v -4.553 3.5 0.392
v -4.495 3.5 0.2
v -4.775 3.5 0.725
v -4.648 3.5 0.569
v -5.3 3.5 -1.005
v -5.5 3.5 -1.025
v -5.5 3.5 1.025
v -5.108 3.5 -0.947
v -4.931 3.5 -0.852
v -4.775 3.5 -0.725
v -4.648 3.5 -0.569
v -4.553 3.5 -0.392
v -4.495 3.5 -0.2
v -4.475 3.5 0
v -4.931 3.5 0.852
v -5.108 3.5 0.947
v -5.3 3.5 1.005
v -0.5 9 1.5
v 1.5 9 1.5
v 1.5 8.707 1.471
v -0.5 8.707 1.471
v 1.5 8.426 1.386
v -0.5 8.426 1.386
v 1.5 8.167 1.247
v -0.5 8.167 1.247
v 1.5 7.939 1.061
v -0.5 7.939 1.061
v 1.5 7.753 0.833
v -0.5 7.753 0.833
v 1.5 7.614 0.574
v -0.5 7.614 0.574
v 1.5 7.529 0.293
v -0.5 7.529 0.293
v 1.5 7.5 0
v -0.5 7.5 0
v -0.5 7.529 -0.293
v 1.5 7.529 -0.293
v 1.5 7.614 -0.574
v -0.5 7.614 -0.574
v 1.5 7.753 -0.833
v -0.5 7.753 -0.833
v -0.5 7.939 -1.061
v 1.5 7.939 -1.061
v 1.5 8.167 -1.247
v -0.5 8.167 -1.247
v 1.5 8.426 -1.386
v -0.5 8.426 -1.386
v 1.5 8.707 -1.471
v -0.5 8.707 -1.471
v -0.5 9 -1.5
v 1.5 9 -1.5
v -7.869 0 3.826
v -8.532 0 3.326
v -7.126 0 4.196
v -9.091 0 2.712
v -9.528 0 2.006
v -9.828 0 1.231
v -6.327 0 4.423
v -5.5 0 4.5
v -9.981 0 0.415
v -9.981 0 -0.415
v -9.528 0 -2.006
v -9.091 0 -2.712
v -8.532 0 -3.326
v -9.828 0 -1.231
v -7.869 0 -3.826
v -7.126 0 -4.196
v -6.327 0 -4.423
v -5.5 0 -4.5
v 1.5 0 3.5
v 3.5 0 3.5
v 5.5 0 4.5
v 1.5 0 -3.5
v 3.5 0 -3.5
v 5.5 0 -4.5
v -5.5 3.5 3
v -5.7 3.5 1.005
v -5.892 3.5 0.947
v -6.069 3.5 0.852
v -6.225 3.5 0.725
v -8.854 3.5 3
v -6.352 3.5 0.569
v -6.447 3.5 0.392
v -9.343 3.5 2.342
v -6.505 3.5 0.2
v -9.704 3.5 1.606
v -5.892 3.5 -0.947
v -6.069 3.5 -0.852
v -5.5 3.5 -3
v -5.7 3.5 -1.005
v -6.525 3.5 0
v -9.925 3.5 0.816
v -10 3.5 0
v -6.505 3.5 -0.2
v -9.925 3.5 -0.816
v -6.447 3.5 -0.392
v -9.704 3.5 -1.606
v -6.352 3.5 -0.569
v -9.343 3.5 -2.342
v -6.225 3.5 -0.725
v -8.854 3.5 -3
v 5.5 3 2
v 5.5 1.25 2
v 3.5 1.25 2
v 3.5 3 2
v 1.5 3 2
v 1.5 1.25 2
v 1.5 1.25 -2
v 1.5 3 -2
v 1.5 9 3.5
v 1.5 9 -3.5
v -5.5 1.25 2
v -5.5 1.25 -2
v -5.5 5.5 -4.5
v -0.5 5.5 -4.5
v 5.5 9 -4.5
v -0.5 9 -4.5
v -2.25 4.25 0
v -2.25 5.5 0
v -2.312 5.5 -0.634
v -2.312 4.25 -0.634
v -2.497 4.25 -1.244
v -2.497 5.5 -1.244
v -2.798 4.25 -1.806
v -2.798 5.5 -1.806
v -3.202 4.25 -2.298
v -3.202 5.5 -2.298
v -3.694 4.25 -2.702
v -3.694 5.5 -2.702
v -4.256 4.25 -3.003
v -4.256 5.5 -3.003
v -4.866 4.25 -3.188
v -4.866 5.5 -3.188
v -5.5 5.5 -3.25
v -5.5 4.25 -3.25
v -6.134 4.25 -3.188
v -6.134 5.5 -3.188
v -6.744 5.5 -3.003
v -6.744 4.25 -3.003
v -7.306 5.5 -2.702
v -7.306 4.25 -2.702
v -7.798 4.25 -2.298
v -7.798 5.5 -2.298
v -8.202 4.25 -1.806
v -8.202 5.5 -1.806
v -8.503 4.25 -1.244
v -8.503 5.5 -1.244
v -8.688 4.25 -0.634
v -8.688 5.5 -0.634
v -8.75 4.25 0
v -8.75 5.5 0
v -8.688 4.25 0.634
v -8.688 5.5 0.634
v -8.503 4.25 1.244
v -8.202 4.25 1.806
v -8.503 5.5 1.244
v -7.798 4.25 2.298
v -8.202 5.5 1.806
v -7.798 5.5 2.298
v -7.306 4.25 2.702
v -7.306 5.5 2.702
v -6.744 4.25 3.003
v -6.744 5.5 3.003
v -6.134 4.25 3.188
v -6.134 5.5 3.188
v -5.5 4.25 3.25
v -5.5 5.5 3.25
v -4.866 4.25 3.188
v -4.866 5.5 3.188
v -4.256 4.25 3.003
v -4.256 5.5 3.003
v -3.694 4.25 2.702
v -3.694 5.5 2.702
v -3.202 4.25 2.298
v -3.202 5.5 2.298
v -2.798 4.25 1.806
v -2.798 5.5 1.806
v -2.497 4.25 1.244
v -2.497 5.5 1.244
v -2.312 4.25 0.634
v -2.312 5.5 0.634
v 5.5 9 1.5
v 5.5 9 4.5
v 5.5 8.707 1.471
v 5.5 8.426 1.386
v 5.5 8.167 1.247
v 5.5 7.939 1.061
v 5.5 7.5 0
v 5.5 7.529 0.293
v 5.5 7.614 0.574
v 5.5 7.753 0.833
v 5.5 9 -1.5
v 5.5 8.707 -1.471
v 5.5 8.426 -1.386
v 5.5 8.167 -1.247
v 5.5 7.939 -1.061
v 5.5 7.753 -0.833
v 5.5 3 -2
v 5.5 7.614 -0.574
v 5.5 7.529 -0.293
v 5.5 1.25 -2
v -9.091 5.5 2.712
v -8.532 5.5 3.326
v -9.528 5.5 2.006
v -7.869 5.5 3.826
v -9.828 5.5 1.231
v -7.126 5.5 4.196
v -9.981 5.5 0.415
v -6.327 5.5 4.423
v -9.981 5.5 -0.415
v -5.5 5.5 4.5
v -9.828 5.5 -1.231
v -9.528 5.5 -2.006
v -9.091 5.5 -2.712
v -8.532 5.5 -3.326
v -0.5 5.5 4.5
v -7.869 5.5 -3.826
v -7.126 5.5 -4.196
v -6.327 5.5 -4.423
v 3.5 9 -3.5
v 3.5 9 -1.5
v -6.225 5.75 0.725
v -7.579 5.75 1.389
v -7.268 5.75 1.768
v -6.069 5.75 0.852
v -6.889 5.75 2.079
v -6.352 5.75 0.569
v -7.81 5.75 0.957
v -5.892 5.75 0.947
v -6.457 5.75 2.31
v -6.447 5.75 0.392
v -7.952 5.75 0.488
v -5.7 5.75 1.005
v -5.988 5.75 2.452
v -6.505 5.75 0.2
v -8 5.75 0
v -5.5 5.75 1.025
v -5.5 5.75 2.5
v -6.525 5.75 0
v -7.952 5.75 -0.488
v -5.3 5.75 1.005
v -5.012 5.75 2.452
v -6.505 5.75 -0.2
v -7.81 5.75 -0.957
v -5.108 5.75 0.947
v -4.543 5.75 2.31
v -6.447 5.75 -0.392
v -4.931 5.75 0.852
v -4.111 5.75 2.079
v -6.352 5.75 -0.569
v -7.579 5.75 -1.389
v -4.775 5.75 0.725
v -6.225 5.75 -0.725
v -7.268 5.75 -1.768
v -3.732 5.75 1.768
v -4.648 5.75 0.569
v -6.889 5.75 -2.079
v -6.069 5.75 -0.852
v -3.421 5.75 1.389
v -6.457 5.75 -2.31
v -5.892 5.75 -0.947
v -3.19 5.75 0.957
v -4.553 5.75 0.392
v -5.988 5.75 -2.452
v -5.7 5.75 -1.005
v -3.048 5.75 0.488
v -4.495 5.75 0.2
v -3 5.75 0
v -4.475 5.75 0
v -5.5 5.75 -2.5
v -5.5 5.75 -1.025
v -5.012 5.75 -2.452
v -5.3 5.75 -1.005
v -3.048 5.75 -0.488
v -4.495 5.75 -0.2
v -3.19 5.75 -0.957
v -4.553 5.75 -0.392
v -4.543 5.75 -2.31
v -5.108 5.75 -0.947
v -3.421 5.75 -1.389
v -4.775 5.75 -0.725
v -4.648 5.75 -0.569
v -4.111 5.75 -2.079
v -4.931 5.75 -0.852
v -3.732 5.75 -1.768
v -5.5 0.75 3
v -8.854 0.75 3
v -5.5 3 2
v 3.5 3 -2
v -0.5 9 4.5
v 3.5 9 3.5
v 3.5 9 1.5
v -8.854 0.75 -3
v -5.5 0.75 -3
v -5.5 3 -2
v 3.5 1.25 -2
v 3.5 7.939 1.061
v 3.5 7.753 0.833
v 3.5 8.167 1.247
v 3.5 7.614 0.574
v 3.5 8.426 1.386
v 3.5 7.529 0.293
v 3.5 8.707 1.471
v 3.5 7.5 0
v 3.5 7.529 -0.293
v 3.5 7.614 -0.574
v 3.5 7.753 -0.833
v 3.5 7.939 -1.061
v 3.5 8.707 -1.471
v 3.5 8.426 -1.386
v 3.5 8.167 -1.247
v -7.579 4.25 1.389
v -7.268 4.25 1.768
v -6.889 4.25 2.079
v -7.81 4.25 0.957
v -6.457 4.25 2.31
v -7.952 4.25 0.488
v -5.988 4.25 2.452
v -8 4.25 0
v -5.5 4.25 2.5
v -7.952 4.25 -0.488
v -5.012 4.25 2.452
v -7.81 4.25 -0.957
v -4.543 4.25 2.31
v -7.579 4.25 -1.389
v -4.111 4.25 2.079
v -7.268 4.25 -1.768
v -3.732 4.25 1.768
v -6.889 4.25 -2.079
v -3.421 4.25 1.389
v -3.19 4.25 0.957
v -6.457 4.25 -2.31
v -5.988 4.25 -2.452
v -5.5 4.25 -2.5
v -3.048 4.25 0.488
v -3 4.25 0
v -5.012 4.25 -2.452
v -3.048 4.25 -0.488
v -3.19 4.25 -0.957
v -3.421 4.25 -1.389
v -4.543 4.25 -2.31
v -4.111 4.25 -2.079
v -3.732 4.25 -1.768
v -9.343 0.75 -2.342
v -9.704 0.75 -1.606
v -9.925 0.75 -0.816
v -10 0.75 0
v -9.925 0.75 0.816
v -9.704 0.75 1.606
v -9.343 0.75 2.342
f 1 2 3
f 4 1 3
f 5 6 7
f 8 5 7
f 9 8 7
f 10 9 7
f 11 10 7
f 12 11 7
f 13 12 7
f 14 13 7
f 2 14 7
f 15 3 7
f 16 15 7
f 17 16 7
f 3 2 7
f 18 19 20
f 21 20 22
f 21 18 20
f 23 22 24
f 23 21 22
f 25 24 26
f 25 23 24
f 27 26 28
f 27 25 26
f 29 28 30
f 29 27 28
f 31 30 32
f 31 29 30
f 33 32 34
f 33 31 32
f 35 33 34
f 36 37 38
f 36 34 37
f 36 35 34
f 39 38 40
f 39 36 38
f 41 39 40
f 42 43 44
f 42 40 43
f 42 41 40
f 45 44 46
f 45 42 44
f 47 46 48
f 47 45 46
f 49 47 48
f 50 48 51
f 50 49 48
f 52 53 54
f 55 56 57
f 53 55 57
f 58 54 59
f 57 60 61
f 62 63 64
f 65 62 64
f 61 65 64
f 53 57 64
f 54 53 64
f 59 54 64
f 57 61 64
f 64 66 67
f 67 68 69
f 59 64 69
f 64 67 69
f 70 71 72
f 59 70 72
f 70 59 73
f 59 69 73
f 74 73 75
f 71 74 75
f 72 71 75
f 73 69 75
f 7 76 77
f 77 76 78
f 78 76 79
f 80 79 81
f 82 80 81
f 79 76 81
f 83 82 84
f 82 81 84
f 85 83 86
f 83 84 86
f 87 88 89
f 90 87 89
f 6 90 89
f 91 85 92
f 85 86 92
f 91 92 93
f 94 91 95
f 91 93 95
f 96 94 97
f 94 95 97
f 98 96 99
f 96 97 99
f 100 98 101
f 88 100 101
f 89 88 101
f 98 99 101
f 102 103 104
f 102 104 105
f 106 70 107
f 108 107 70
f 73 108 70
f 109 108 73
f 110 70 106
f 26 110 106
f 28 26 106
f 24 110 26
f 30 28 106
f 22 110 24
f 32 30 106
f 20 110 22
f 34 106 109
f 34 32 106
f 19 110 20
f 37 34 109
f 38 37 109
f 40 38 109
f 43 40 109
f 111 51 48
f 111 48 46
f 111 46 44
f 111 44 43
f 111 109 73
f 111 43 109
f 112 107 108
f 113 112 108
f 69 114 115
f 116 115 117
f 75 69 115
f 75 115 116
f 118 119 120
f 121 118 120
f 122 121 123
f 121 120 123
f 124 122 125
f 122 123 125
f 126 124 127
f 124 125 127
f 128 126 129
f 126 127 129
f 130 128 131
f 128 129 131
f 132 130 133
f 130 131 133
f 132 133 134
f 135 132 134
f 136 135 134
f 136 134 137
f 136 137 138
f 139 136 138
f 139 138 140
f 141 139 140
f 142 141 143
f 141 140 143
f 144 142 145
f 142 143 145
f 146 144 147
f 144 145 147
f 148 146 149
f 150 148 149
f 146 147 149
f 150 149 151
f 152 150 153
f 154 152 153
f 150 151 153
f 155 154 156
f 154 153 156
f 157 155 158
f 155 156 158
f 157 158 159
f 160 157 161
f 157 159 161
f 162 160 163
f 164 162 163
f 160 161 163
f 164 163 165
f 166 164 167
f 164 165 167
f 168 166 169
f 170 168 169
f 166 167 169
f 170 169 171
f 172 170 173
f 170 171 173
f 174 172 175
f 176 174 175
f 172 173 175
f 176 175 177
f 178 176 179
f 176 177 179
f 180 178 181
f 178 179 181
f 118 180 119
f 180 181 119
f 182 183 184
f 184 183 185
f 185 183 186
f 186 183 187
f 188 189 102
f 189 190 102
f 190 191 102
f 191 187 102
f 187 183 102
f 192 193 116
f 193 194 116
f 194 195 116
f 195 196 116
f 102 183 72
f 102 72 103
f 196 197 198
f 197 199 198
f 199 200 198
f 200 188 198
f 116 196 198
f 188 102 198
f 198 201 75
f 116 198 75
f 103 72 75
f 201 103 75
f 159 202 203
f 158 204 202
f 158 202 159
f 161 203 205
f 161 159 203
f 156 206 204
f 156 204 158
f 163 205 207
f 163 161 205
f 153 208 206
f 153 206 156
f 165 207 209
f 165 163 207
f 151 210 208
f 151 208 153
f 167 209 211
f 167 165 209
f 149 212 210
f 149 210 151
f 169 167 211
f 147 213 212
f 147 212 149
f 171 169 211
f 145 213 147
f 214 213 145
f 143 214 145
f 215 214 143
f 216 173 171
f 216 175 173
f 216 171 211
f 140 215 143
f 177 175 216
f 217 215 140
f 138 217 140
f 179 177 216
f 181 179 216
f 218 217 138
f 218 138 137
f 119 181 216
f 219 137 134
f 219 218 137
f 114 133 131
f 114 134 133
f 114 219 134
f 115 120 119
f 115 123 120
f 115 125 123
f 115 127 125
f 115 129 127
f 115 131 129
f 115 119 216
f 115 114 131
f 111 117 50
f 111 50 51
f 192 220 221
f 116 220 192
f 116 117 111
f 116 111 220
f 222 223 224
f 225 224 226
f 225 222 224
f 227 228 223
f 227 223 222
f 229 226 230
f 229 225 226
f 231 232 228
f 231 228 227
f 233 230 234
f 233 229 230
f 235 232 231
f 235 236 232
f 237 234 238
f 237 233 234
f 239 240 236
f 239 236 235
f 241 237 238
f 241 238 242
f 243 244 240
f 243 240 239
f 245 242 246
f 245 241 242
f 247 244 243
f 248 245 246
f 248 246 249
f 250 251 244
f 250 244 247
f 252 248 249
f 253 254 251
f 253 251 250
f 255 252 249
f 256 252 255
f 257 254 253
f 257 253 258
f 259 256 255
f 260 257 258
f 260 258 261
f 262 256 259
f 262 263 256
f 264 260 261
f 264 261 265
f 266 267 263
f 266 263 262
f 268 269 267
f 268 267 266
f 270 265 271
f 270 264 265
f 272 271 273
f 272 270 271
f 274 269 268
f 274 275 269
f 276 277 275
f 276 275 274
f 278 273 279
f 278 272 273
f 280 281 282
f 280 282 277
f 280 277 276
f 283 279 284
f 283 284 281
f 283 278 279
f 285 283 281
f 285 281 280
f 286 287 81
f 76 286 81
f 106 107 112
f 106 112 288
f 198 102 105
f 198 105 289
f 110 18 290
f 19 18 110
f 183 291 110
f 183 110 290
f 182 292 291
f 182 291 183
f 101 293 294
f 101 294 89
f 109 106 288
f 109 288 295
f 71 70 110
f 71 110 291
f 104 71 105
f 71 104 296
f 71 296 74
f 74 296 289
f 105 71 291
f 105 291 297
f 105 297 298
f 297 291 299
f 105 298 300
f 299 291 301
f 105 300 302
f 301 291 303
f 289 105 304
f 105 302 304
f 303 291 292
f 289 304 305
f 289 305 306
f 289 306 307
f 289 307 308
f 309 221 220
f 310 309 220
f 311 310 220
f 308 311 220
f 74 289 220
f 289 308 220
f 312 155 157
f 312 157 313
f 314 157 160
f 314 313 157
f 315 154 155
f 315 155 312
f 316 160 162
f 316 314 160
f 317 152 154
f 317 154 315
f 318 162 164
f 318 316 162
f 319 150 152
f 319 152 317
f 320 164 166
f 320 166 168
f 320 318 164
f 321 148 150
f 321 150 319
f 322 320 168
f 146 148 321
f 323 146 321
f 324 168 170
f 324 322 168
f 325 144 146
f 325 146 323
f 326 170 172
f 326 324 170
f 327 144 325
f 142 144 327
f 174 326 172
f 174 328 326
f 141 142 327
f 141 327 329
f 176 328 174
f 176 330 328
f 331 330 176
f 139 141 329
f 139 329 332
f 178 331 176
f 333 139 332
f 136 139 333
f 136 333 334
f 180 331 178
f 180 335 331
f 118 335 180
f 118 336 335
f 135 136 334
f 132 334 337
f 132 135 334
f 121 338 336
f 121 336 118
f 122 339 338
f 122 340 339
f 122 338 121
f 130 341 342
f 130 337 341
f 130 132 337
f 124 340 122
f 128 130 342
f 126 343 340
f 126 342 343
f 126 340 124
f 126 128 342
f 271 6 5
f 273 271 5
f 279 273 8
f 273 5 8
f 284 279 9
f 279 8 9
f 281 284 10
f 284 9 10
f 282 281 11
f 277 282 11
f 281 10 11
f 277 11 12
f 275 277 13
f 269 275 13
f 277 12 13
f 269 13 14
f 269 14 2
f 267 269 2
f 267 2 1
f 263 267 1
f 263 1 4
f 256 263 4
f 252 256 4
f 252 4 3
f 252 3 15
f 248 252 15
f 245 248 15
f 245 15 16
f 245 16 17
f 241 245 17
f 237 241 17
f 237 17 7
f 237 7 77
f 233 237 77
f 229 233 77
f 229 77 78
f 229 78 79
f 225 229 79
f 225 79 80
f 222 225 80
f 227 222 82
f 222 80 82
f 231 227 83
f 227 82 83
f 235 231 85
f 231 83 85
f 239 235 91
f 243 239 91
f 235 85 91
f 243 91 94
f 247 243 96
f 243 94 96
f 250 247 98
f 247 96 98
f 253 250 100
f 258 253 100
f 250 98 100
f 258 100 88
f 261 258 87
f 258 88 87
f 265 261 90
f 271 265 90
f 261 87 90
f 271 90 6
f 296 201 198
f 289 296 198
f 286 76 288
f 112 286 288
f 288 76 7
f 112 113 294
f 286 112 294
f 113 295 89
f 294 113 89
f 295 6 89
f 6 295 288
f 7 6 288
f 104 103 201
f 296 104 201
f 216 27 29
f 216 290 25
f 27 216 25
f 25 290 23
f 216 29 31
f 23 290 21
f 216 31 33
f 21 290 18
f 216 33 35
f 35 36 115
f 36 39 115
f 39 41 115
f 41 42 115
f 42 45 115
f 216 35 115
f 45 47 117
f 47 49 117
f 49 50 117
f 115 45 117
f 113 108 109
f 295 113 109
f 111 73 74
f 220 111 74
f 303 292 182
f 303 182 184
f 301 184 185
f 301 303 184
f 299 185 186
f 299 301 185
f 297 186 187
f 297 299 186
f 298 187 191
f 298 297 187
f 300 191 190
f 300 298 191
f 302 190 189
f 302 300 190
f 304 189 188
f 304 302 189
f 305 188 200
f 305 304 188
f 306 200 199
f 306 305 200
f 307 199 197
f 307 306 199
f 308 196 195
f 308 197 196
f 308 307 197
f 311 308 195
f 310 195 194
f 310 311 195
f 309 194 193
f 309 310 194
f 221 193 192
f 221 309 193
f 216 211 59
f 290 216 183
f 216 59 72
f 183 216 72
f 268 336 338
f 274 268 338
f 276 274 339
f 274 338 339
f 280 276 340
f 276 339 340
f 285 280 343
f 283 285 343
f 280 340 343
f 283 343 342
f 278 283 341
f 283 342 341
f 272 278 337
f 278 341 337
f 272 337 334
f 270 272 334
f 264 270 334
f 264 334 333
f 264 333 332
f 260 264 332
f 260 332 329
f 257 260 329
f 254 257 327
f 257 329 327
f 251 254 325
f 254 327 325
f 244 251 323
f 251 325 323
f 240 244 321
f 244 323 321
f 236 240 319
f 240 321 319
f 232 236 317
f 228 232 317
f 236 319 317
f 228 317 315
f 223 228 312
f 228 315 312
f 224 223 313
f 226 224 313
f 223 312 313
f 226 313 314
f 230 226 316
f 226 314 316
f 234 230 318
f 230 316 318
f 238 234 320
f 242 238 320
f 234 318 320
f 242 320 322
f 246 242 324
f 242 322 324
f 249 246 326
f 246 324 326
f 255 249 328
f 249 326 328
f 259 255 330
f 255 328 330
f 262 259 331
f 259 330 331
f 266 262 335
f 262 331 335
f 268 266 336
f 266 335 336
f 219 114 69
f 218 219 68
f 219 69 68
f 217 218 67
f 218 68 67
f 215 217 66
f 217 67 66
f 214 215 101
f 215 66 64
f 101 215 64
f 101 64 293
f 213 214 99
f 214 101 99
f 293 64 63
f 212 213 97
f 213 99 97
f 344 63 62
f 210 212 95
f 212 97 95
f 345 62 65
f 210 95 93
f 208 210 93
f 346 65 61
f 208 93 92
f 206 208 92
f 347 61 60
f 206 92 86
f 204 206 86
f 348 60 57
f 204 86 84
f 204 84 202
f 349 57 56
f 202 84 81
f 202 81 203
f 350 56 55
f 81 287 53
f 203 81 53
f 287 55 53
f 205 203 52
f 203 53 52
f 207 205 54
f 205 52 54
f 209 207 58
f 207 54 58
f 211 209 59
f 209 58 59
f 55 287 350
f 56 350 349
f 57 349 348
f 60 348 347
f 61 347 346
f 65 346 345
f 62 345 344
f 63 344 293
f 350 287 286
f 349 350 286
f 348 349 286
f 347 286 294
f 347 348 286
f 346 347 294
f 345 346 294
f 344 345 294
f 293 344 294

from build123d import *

# Parameters (mm, degrees)
SKETCH2_W               = 11
SKETCH2_H               = 9
BOSS_EXTRUDE1_DEPTH     = 9
SKETCH3_W               = 15.859827236
SKETCH3_H               = 9.999542671
CUT_EXTRUDE1_DEPTH      = 3.5
CUT_EXTRUDE2_DEPTH      = 13.5
SKETCH5_W               = 2
SKETCH5_H               = 7
CUT_EXTRUDE3_DEPTH      = 28.773973587
SKETCH6_R               = 3.25
CUT_EXTRUDE4_DEPTH      = 1.25
SKETCH7_R               = 2.5
BOSS_EXTRUDE2_DEPTH     = 1.5
SKETCH8_W               = 4
SKETCH8_H               = 1.75
CUT_EXTRUDE5_DEPTH      = 21.5
SKETCH9_W               = 6
SKETCH9_H               = 2.75
CUT_EXTRUDE6_DEPTH      = 4.5
M2_5_TAPPED_HOLE2_D     = 2.05
M2_5_TAPPED_HOLE2_DEPTH = 3
M2_5_TAPPED_HOLE2_TIP   = 0.615882135
SKETCH11_W              = 2.05
SKETCH11_H              = 0.5
BOSS_EXTRUDE3_DEPTH     = 4


with BuildPart() as part:
    # Sketch2 → Boss-Extrude1 (new body)
    with BuildSketch(Plane(origin=(0, 0, 0), x_dir=(1, 0, 0), z_dir=(0, 1, 0))):
        with BuildLine():
            Line((-5.5, -4.5), (-5.5, 4.5))
            ThreePointArc((-5.5, 4.5), (-10, 0), (-5.5, -4.5))
        make_face()
        Rectangle(SKETCH2_W, SKETCH2_H)
    extrude(amount=BOSS_EXTRUDE1_DEPTH)

    # Sketch3 → Cut-Extrude1 (cut)
    with BuildSketch(Plane(origin=(0, 9, 0), x_dir=(1, 0, 0), z_dir=(0, 1, 0))):
        with Locations((-8.429913618, -0.499771336)):
            Rectangle(SKETCH3_W, SKETCH3_H)
    extrude(amount=-CUT_EXTRUDE1_DEPTH, mode=Mode.SUBTRACT)

    # Sketch4 → Cut-Extrude2 (cut)
    with BuildSketch(Plane.ZY.offset(0.5)):
        with BuildLine():
            Line((-1.5, 9), (1.5, 9))
            ThreePointArc((1.5, 9), (0, 7.5), (-1.5, 9))
        make_face()
    extrude(amount=-CUT_EXTRUDE2_DEPTH, mode=Mode.SUBTRACT)

    # Sketch5 → Cut-Extrude3 (cut)
    with BuildSketch(Plane(origin=(0, 9, 0), x_dir=(1, 0, 0), z_dir=(0, 1, 0))):
        with Locations((2.5, 0)):
            Rectangle(SKETCH5_W, SKETCH5_H)
    extrude(amount=-CUT_EXTRUDE3_DEPTH, mode=Mode.SUBTRACT)

    # Sketch6 → Cut-Extrude4 (cut)
    with BuildSketch(Plane(origin=(0, 5.5, 0), x_dir=(1, 0, 0), z_dir=(0, 1, 0))):
        with Locations((-5.5, 0)):
            Circle(SKETCH6_R)
    extrude(amount=-CUT_EXTRUDE4_DEPTH, mode=Mode.SUBTRACT)

    # Sketch7 → Boss-Extrude2 (add)
    with BuildSketch(Plane(origin=(0, 4.25, 0), x_dir=(1, 0, 0), z_dir=(0, 1, 0))):
        with Locations((-5.5, 0)):
            Circle(SKETCH7_R)
    extrude(amount=BOSS_EXTRUDE2_DEPTH)

    # Sketch8 → Cut-Extrude5 (cut)
    with BuildSketch(Plane(origin=(5.5, 0, 0), x_dir=(0, 0, -1), z_dir=(1, 0, 0))):
        with Locations((0, 2.125)):
            Rectangle(SKETCH8_W, SKETCH8_H)
    extrude(amount=-CUT_EXTRUDE5_DEPTH, mode=Mode.SUBTRACT)

    # Sketch9 → Cut-Extrude6 (cut)
    with BuildSketch(Plane(origin=(-10, 0, 0), x_dir=(0, 0, -1), z_dir=(1, 0, 0))):
        with Locations((0, 2.125)):
            Rectangle(SKETCH9_W, SKETCH9_H)
    extrude(amount=CUT_EXTRUDE6_DEPTH, mode=Mode.SUBTRACT)

    # M2.5 Tapped Hole2
    with Locations(Plane(origin=(-5.5, 5.75, 0), x_dir=(0, 0, 1), z_dir=(0, 1, 0))):
        with Locations((0, 0)):
            Hole(M2_5_TAPPED_HOLE2_D / 2, depth=M2_5_TAPPED_HOLE2_DEPTH)
            with Locations((0, 0, -(M2_5_TAPPED_HOLE2_DEPTH + M2_5_TAPPED_HOLE2_TIP / 2))):  # 118° drill point
                Cone(0, M2_5_TAPPED_HOLE2_D / 2, M2_5_TAPPED_HOLE2_TIP, mode=Mode.SUBTRACT)

    # Sketch11 → Boss-Extrude3 (add)
    with BuildSketch(Plane.ZY.offset(5.5)):
        with Locations((0, 3.25)):
            Rectangle(SKETCH11_W, SKETCH11_H)
    extrude(amount=-BOSS_EXTRUDE3_DEPTH)


solid = part.part
